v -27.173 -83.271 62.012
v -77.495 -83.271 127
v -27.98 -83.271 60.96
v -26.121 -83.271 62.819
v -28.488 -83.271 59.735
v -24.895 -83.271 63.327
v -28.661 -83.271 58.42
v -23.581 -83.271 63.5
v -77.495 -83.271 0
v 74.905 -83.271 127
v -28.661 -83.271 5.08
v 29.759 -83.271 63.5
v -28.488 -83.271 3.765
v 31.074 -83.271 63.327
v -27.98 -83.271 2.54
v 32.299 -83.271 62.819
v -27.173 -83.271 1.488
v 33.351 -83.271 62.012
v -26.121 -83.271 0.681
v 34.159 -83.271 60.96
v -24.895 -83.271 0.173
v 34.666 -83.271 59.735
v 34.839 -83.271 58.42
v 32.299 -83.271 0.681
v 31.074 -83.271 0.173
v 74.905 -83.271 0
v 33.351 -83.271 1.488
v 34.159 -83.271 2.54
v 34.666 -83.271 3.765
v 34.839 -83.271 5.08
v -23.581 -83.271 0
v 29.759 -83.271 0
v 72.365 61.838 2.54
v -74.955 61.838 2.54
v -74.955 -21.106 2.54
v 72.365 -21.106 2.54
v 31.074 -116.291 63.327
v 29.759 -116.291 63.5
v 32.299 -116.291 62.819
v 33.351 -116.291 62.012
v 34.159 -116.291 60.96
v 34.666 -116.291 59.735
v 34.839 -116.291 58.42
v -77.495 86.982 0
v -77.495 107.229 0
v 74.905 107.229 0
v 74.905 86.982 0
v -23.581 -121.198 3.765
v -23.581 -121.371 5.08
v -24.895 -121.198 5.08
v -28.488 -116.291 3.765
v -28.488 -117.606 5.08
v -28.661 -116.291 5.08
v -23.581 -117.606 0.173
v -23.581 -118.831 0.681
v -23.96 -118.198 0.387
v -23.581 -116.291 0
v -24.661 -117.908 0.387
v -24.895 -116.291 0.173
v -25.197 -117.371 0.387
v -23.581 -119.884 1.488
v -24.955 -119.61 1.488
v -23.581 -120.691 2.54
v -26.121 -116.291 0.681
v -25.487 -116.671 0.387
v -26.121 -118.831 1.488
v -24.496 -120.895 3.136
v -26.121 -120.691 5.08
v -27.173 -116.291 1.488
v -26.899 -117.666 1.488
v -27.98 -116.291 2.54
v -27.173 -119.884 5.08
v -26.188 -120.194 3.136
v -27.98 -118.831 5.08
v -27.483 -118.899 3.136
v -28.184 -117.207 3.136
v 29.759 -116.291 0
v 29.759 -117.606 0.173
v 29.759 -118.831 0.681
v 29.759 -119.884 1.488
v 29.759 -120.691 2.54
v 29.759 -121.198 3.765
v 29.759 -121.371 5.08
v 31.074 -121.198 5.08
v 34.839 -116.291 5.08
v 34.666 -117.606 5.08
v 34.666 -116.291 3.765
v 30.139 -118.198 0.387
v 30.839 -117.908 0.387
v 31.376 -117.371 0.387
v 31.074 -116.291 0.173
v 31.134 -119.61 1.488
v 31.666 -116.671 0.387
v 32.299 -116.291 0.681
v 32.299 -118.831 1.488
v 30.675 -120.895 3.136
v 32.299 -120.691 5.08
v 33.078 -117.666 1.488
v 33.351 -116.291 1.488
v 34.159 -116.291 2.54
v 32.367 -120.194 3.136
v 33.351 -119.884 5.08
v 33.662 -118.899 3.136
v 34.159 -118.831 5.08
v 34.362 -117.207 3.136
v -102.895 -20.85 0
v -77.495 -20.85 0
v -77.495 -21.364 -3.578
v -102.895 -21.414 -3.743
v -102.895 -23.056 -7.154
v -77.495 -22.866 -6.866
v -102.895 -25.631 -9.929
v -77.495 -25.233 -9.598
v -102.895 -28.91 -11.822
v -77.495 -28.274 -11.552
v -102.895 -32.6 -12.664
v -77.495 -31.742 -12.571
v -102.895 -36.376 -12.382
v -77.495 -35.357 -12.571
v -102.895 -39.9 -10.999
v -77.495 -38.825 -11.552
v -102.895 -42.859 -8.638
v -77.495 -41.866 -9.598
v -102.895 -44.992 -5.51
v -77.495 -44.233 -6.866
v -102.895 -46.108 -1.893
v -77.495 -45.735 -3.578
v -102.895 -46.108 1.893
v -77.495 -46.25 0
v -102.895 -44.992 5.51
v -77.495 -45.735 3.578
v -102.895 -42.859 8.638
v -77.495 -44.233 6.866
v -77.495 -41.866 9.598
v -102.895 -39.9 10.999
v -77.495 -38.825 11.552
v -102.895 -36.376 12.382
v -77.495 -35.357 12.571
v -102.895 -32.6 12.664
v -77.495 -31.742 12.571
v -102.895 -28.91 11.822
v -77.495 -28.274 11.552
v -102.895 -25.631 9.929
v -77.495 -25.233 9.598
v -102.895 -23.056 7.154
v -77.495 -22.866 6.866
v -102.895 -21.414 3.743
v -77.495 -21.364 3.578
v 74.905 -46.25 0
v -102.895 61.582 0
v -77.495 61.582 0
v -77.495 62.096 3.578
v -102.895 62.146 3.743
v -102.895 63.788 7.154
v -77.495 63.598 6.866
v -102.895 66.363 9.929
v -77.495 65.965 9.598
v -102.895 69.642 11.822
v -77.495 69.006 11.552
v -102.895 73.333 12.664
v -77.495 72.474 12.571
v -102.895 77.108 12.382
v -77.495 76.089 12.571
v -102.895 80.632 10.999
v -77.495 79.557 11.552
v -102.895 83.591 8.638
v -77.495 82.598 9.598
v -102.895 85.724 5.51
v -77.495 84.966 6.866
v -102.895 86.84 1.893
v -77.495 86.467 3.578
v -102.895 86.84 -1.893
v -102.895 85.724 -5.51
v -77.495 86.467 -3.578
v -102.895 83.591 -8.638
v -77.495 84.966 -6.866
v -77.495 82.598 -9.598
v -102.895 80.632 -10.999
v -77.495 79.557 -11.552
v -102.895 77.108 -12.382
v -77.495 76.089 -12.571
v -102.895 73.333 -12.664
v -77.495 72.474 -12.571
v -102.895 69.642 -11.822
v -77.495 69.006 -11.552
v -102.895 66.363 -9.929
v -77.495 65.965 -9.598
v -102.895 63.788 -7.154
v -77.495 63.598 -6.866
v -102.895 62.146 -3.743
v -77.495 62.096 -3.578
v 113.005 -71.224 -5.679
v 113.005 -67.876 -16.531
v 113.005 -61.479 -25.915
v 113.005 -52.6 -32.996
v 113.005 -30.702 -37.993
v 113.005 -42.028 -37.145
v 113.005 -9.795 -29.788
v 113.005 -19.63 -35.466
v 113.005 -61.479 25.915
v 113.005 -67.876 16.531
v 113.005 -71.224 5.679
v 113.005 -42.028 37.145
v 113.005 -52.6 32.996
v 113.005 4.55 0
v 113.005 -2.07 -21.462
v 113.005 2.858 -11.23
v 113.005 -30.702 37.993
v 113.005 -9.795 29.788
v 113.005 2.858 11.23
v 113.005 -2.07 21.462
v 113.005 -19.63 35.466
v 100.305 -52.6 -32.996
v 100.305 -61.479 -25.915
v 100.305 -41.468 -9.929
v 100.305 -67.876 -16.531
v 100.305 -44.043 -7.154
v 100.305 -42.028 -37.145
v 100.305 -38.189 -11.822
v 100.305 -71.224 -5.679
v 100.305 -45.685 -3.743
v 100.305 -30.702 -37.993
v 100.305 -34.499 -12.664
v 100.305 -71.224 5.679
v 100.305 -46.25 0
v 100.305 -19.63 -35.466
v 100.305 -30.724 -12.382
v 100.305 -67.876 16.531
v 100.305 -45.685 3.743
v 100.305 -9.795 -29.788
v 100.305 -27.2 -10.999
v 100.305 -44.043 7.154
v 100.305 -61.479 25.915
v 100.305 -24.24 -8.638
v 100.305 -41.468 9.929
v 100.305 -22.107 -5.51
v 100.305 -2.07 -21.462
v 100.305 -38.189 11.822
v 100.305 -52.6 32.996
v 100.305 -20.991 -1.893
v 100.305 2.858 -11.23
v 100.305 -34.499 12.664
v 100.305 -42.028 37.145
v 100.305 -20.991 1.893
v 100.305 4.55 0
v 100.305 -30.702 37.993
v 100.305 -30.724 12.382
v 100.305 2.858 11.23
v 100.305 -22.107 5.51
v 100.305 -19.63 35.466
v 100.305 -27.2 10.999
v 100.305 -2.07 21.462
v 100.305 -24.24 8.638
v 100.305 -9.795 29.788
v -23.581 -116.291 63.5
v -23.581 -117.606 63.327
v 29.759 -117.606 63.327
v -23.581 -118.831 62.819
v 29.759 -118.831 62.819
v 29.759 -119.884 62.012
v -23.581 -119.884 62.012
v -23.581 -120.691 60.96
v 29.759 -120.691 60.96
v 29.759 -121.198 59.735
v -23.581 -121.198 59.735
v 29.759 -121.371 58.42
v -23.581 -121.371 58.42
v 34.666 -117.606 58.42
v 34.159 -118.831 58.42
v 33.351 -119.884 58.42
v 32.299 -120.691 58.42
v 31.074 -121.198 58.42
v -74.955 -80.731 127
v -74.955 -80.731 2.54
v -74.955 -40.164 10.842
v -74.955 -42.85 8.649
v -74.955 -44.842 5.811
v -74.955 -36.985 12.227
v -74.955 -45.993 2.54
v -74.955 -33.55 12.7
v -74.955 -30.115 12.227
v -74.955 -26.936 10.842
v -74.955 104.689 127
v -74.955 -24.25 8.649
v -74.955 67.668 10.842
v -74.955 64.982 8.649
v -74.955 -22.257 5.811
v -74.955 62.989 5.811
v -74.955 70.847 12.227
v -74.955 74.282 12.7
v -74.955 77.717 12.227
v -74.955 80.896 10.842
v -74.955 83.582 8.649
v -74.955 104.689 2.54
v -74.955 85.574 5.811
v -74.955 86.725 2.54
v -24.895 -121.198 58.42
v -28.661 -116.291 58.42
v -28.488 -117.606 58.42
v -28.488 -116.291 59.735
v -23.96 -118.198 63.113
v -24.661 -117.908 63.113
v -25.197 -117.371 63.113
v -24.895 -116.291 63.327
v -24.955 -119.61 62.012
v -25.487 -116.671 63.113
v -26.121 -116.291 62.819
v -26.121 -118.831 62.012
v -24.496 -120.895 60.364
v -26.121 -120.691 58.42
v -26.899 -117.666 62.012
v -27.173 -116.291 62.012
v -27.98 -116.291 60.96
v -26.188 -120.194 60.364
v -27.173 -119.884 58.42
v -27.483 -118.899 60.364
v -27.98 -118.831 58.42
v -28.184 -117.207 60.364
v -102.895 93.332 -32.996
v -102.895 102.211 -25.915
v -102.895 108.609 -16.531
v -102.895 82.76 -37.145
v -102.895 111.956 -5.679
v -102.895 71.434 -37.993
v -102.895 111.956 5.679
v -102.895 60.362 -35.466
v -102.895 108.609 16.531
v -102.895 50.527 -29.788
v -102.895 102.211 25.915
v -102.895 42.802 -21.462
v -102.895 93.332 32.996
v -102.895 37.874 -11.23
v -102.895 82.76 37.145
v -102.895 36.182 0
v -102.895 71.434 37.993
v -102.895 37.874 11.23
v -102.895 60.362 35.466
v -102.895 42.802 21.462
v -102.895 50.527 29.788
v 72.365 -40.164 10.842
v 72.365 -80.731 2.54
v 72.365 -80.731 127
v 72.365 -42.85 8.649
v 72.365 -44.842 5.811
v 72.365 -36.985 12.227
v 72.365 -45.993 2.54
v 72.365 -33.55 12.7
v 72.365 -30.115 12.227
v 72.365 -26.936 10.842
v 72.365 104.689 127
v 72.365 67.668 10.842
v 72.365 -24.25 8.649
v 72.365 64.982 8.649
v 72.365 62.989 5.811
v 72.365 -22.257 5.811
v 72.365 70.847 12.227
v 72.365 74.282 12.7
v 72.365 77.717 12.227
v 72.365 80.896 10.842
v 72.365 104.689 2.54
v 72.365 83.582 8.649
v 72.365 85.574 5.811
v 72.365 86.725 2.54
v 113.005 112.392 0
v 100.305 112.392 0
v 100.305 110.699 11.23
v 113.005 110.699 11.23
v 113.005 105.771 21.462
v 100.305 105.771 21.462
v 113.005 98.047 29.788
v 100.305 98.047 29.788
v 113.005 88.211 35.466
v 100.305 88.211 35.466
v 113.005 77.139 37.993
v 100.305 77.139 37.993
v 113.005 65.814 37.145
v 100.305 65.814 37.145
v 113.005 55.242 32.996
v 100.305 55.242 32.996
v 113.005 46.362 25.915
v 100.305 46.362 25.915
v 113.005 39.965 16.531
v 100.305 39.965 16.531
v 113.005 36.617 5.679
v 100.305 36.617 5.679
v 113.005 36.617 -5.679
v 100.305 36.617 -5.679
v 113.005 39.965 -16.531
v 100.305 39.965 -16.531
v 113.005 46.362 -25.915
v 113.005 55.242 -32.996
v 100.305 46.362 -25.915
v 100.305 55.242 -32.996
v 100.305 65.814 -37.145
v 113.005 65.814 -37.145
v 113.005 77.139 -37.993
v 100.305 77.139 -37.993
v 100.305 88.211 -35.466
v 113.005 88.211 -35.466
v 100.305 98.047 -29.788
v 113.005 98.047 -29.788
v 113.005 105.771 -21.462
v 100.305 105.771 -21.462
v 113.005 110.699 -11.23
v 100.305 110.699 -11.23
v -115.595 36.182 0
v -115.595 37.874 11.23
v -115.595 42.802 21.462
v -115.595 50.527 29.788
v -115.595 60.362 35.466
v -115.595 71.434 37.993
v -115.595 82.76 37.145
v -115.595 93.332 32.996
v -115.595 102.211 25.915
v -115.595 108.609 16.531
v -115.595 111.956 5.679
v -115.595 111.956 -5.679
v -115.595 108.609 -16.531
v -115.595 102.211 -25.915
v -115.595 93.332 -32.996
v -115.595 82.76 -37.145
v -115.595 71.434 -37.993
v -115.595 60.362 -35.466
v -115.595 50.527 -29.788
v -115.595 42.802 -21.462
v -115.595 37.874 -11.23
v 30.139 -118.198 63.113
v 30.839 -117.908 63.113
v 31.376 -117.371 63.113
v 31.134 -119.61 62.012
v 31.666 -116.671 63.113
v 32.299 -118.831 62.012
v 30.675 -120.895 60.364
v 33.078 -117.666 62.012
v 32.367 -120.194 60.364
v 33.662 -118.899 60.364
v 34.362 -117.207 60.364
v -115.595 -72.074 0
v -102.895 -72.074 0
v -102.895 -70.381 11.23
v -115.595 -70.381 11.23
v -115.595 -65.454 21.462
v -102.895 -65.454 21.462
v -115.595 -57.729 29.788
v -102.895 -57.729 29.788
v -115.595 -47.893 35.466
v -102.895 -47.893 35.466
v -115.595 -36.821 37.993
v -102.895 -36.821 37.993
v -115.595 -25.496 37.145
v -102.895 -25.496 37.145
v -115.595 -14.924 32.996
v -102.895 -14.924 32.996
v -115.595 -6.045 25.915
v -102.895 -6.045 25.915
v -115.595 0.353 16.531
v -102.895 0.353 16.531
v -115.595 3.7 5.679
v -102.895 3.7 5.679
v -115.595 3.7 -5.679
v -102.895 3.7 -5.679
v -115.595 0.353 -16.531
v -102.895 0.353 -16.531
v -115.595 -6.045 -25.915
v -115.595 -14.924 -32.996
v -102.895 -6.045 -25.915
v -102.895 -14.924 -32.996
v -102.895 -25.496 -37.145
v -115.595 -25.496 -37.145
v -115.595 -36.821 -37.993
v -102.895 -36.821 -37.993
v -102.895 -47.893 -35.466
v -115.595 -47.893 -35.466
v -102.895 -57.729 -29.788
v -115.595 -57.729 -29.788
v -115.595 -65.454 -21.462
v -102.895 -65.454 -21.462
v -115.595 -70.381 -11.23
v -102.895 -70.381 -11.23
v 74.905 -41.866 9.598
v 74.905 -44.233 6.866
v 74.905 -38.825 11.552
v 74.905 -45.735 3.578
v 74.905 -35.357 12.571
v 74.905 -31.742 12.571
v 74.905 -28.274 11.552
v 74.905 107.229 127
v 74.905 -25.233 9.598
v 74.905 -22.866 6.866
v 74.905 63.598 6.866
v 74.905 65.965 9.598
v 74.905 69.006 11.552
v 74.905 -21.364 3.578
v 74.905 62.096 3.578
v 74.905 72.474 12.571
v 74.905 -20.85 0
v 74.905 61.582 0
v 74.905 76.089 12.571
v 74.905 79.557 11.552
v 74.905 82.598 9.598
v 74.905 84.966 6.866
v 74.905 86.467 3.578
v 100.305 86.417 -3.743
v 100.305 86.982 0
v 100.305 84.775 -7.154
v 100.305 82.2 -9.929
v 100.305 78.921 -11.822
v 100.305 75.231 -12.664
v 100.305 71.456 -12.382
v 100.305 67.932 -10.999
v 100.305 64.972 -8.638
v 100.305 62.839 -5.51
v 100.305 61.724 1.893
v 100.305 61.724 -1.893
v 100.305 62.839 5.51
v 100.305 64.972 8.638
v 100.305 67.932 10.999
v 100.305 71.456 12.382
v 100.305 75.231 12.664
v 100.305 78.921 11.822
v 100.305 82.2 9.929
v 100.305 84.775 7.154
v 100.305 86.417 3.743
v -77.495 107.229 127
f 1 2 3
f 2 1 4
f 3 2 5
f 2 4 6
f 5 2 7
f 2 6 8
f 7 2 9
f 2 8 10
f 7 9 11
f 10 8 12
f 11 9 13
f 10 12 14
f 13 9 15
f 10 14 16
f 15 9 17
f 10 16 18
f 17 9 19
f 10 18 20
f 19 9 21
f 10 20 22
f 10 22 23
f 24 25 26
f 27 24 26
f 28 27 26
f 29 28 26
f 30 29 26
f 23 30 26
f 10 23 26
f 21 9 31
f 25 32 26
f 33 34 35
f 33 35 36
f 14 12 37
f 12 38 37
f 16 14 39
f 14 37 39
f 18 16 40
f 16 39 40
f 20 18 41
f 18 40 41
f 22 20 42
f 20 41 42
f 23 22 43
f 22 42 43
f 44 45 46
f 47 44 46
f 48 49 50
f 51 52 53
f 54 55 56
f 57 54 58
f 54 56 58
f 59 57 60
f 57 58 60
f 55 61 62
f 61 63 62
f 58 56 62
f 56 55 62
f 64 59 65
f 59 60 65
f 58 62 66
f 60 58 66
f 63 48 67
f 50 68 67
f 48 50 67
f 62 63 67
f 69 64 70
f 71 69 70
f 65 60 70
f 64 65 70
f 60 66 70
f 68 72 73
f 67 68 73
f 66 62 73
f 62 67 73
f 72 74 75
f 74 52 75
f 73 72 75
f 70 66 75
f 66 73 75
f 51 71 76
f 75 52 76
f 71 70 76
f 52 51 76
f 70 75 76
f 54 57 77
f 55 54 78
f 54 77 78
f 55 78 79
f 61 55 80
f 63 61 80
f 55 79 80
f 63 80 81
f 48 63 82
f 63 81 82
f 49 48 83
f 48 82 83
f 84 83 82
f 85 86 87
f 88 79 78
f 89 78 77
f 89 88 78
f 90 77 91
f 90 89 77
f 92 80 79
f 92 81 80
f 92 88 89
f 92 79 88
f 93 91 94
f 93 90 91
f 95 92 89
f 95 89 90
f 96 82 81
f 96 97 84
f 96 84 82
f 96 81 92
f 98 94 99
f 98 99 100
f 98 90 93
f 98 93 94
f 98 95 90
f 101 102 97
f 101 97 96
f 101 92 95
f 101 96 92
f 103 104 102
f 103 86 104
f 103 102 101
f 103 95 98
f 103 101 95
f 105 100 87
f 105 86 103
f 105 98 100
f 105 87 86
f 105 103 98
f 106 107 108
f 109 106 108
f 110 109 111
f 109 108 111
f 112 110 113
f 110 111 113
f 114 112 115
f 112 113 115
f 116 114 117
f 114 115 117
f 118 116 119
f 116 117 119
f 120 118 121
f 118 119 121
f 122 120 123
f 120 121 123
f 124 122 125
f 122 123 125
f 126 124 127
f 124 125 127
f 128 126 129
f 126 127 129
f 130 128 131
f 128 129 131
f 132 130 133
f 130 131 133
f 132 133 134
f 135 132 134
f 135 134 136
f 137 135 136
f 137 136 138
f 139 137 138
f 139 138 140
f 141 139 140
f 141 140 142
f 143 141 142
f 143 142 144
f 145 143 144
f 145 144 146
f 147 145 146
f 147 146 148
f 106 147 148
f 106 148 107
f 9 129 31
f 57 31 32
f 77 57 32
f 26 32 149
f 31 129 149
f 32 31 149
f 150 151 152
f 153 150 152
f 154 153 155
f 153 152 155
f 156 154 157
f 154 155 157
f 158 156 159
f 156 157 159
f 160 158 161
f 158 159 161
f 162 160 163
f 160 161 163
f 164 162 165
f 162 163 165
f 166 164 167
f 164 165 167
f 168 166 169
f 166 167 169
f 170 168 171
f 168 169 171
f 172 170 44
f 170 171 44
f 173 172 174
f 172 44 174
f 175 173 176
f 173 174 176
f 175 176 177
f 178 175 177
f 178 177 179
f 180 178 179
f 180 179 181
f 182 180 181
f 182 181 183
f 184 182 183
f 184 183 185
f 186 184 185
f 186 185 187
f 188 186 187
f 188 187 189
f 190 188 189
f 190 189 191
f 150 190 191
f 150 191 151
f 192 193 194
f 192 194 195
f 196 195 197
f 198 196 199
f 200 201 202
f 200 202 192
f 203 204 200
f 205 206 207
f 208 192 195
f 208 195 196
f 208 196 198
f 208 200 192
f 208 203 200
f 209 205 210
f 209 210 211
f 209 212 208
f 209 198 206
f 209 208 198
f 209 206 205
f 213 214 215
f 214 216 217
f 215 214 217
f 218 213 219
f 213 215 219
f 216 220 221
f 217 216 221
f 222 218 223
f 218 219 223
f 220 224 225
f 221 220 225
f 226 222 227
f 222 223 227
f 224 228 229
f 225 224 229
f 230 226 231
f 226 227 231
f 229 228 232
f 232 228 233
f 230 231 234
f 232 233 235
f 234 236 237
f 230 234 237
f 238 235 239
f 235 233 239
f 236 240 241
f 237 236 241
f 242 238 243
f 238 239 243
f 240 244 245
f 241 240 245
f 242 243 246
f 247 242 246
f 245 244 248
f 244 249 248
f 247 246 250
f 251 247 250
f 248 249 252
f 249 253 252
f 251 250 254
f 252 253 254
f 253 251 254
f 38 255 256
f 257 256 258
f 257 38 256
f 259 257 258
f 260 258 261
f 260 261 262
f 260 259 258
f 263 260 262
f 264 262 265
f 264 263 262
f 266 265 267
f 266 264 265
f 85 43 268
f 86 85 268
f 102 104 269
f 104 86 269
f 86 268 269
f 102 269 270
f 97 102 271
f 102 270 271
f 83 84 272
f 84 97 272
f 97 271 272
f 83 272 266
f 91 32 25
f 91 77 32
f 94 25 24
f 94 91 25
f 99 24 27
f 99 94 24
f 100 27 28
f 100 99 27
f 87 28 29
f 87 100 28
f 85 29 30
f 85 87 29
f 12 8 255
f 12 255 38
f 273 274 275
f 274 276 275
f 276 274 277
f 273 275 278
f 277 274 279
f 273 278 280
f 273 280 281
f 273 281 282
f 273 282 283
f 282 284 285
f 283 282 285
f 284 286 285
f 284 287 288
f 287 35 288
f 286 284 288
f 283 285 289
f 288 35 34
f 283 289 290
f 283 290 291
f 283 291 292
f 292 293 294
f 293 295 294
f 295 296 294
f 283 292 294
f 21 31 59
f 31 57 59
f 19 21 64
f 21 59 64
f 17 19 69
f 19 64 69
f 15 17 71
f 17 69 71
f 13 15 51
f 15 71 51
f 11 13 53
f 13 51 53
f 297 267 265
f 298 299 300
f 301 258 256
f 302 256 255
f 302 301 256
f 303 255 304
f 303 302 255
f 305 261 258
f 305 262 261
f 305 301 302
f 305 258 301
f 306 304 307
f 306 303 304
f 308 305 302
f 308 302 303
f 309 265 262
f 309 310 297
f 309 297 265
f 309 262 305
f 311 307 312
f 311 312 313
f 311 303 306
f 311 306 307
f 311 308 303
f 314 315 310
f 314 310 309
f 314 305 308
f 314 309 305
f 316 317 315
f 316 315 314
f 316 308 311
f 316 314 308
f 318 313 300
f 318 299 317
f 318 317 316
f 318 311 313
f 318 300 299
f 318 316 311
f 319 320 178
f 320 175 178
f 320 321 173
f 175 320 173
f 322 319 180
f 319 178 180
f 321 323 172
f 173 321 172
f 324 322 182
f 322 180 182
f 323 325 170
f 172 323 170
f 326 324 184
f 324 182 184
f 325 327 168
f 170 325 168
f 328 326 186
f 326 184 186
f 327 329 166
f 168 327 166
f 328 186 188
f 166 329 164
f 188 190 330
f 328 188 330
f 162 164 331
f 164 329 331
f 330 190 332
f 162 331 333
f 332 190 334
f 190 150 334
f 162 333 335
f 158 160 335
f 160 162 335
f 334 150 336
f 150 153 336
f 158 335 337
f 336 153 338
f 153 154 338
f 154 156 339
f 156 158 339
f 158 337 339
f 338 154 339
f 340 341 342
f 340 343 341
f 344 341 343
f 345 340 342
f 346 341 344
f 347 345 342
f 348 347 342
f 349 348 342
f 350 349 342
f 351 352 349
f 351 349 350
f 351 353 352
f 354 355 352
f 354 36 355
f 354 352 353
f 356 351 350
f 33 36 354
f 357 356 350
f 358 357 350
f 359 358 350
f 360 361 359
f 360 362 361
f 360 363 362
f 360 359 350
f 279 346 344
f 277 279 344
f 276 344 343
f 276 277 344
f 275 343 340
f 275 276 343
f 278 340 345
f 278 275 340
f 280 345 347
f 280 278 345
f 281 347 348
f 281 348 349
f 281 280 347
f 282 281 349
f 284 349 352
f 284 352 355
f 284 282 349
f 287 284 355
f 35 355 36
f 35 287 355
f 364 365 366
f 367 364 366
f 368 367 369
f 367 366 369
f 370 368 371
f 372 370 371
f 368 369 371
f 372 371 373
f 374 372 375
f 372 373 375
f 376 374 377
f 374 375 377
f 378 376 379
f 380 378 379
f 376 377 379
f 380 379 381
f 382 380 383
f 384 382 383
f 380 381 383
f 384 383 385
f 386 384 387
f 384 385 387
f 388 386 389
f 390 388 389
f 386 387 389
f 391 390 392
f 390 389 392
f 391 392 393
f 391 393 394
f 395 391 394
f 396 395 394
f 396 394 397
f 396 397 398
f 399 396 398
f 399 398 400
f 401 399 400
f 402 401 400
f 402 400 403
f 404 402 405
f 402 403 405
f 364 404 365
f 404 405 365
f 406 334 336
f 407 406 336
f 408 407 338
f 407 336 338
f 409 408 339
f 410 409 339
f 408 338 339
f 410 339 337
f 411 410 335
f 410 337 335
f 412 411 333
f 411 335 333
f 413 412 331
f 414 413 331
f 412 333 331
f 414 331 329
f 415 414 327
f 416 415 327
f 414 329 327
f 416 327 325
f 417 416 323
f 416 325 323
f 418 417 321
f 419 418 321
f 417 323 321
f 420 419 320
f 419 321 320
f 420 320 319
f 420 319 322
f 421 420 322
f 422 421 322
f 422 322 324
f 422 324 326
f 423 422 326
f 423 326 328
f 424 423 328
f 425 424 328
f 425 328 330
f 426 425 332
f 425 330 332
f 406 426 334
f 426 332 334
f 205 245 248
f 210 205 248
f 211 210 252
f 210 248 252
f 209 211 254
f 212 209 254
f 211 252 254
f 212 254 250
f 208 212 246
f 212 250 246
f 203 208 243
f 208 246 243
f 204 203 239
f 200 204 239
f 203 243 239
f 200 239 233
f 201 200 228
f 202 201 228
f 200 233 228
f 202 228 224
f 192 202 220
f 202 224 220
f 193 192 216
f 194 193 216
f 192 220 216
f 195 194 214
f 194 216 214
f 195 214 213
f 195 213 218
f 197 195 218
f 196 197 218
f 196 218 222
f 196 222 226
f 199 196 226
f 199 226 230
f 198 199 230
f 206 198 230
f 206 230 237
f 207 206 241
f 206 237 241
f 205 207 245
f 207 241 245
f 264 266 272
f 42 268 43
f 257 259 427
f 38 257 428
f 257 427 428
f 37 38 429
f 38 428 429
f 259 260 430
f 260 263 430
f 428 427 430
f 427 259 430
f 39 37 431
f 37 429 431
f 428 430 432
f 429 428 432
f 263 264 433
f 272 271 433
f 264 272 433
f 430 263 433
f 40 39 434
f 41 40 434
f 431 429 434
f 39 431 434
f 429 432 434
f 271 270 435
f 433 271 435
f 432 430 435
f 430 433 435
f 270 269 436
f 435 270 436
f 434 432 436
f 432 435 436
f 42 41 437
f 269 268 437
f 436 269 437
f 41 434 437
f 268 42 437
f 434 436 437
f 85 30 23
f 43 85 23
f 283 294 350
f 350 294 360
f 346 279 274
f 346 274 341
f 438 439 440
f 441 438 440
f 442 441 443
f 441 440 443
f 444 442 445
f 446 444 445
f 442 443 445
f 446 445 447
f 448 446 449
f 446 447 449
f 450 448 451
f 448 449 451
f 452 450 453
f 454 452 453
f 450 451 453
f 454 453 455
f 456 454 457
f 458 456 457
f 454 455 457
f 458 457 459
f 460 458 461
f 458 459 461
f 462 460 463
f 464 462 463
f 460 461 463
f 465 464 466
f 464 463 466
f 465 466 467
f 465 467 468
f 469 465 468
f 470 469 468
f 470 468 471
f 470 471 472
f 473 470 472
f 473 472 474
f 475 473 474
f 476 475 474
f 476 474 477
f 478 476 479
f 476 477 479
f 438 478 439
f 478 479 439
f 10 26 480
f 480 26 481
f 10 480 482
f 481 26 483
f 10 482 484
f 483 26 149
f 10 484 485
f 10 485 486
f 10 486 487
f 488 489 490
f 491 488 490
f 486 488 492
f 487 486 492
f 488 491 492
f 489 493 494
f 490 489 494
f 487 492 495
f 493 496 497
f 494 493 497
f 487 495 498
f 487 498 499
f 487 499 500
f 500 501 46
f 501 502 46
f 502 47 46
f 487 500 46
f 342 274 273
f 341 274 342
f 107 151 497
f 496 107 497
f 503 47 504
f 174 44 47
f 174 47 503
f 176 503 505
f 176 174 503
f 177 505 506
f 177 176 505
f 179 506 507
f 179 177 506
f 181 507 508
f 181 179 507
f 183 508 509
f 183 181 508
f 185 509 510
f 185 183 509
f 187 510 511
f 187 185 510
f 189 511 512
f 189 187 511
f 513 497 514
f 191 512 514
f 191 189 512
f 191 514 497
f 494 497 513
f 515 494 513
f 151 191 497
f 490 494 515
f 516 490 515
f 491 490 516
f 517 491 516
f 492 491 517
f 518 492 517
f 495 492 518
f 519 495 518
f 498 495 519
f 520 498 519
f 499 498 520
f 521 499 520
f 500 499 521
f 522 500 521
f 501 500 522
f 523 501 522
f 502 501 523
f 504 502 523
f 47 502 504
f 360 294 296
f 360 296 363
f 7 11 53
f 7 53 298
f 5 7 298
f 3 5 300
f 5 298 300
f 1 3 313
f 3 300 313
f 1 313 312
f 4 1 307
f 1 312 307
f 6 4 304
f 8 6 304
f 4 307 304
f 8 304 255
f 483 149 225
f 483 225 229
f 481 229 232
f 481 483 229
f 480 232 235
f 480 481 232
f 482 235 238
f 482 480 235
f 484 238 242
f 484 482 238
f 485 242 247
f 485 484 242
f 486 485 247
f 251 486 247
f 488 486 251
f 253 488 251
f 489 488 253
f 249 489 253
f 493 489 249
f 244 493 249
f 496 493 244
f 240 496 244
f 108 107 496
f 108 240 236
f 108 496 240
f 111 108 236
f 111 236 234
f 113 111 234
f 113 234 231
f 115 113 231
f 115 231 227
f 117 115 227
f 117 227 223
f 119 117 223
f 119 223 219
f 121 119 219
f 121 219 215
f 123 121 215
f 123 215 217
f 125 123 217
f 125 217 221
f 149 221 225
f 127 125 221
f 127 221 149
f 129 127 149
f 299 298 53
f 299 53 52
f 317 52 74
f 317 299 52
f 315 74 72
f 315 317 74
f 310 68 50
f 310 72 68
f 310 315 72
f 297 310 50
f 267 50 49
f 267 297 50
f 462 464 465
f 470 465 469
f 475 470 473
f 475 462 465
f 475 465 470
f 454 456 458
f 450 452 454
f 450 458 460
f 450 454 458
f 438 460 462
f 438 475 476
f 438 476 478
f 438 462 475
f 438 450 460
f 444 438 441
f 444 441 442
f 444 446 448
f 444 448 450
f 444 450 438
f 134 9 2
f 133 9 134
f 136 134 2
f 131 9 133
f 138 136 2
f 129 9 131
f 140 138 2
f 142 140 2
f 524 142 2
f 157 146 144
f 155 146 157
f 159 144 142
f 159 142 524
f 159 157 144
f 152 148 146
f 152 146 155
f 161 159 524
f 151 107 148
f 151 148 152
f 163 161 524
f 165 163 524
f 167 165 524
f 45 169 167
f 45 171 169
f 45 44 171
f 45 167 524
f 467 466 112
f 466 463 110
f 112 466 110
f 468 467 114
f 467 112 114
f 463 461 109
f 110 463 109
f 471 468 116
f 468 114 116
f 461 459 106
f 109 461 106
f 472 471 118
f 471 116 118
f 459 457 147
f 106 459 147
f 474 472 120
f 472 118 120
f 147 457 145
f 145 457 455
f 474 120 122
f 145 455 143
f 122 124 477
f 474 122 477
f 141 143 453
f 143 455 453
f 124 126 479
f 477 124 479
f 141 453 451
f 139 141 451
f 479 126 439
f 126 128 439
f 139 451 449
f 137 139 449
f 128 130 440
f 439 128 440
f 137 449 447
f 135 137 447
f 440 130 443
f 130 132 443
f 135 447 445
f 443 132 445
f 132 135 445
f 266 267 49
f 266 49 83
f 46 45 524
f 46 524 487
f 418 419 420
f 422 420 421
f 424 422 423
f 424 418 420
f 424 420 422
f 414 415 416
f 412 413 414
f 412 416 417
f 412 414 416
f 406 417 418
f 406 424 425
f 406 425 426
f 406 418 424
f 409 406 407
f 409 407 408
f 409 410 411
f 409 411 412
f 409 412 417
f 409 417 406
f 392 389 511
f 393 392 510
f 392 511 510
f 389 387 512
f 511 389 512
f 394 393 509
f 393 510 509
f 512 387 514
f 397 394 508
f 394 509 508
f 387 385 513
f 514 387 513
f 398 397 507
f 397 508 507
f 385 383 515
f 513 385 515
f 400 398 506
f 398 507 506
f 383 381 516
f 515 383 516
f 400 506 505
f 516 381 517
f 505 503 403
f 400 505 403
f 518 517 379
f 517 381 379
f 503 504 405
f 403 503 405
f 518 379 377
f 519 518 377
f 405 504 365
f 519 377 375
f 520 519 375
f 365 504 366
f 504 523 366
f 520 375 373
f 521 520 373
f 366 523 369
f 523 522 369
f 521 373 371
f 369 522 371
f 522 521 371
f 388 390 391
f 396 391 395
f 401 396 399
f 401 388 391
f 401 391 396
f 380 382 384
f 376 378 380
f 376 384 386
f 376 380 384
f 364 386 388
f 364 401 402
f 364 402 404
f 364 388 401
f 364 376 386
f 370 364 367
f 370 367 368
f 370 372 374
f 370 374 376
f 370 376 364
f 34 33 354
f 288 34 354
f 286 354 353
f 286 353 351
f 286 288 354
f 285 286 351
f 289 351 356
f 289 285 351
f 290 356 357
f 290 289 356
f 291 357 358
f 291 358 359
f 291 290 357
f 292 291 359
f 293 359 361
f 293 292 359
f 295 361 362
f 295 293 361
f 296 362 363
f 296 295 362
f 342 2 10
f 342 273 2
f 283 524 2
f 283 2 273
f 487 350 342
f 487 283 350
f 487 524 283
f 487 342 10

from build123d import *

# Parameters (mm, degrees)
F0_W      = 152.4
F0_H      = 190.5
F1_DEPTH  = 127
F2_T      = -2.54
F3_W      = 63.5
F3_H      = 63.5
F4_DEPTH  = 38.1
F5_R      = 5.08
F7_DEPTH  = 177.8
F8_R      = 38.1
F9_DEPTH  = 12.7
F11_DEPTH = 25.4
F12_R     = 38.1
F12_R_2   = 12.7
F13_DEPTH = 12.7


with BuildPart() as f1:
    # F0 (on Top) → F1 (new body)
    with BuildSketch(Plane.XY):
        with Locations((-1.2951251119, 11.9785609818)):
            Rectangle(F0_W, F0_H)
    extrude(amount=F1_DEPTH)

    # F2
    f2_openings = [f1.faces().sort_by_distance(p)[0] for p in [
        (-1.295125, 11.978561, 127),
    ]]
    offset(amount=F2_T, openings=f2_openings)

    # F3 (on face) → F4 (join)
    with BuildSketch(Plane.XZ.offset(83.2714390182)):
        with Locations((3.0893431157, 31.75)):
            Rectangle(F3_W, F3_H)
    extrude(amount=F4_DEPTH)

    # F5
    f5_edges = [f1.edges().sort_by_distance(p)[0] for p in [
        (-28.660657, -121.371439, 31.75),
        (34.839343, -121.371439, 31.75),
        (3.089343, -121.371439, 63.5),
        (34.839343, -102.321439, 63.5),
        (-28.660657, -102.321439, 63.5),
        (3.089343, -121.371439, 0),
        (-28.660657, -102.321439, 0),
        (34.839343, -102.321439, 0),
    ]]
    fillet(f5_edges, radius=F5_R)

    # F6 (on face) → F7 (join)
    with BuildSketch(Plane(origin=(-77.4951251119, 0, 0), x_dir=(0, -1, 0), z_dir=(-1, 0, 0))):
        with BuildLine():
            ThreePointArc((20.8495695472, 0), (33.5495695472, -12.7), (46.2495695472, 0))
            Line((46.2495695472, 0), (20.8495695472, 0))
        make_face()
        with BuildLine():
            Line((-86.981655252, 0), (-61.581655252, 0))
            ThreePointArc((-61.581655252, 0), (-74.281655252, 12.7), (-86.981655252, 0))
        make_face()
        with BuildLine():
            Line((20.8495695472, 0), (46.2495695472, 0))
            ThreePointArc((46.2495695472, 0), (33.5495695472, 12.7), (20.8495695472, 0))
        make_face()
        with BuildLine():
            ThreePointArc((-86.981655252, 0), (-74.281655252, -12.7), (-61.581655252, 0))
            Line((-61.581655252, 0), (-86.981655252, 0))
        make_face()
    extrude(amount=-F7_DEPTH)

    # F8 (on face) → F9 (join)
    with BuildSketch(Plane.YZ.offset(100.3048748881)):
        with Locations((-33.5495695472, 0)):
            Circle(F8_R)
        with Locations((74.2916837335, 0)):
            Circle(F8_R)
    extrude(amount=F9_DEPTH)

    # F10 (on face) → F11 (join)
    with BuildSketch(Plane(origin=(-77.4951251119, 0, 0), x_dir=(0, -1, 0), z_dir=(-1, 0, 0))):
        with BuildLine():
            ThreePointArc((46.2495695472, 0), (33.5495695472, 12.7), (20.8495695472, 0))
            ThreePointArc((20.8495695472, 0), (33.5495695472, -12.7), (46.2495695472, 0))
        make_face()
        with BuildLine():
            ThreePointArc((-86.981655252, 0), (-74.281655252, -12.7), (-61.581655252, 0))
            ThreePointArc((-61.581655252, 0), (-74.281655252, 12.7), (-86.981655252, 0))
        make_face()
    extrude(amount=F11_DEPTH)

    # F12 (on face) → F13 (join)
    with BuildSketch(Plane(origin=(-102.8951251119, 0, 0), x_dir=(0, -1, 0), z_dir=(-1, 0, 0))):
        with Locations((-74.281655252, 0)):
            Circle(F12_R)
        with Locations((-74.281655252, 0)):
            Circle(F12_R_2, mode=Mode.SUBTRACT)
        with Locations((33.9739844203, 0)):
            Circle(F12_R)
        with Locations((-74.281655252, 0)):
            Circle(F12_R_2)
    extrude(amount=F13_DEPTH)


solid = f1.part
